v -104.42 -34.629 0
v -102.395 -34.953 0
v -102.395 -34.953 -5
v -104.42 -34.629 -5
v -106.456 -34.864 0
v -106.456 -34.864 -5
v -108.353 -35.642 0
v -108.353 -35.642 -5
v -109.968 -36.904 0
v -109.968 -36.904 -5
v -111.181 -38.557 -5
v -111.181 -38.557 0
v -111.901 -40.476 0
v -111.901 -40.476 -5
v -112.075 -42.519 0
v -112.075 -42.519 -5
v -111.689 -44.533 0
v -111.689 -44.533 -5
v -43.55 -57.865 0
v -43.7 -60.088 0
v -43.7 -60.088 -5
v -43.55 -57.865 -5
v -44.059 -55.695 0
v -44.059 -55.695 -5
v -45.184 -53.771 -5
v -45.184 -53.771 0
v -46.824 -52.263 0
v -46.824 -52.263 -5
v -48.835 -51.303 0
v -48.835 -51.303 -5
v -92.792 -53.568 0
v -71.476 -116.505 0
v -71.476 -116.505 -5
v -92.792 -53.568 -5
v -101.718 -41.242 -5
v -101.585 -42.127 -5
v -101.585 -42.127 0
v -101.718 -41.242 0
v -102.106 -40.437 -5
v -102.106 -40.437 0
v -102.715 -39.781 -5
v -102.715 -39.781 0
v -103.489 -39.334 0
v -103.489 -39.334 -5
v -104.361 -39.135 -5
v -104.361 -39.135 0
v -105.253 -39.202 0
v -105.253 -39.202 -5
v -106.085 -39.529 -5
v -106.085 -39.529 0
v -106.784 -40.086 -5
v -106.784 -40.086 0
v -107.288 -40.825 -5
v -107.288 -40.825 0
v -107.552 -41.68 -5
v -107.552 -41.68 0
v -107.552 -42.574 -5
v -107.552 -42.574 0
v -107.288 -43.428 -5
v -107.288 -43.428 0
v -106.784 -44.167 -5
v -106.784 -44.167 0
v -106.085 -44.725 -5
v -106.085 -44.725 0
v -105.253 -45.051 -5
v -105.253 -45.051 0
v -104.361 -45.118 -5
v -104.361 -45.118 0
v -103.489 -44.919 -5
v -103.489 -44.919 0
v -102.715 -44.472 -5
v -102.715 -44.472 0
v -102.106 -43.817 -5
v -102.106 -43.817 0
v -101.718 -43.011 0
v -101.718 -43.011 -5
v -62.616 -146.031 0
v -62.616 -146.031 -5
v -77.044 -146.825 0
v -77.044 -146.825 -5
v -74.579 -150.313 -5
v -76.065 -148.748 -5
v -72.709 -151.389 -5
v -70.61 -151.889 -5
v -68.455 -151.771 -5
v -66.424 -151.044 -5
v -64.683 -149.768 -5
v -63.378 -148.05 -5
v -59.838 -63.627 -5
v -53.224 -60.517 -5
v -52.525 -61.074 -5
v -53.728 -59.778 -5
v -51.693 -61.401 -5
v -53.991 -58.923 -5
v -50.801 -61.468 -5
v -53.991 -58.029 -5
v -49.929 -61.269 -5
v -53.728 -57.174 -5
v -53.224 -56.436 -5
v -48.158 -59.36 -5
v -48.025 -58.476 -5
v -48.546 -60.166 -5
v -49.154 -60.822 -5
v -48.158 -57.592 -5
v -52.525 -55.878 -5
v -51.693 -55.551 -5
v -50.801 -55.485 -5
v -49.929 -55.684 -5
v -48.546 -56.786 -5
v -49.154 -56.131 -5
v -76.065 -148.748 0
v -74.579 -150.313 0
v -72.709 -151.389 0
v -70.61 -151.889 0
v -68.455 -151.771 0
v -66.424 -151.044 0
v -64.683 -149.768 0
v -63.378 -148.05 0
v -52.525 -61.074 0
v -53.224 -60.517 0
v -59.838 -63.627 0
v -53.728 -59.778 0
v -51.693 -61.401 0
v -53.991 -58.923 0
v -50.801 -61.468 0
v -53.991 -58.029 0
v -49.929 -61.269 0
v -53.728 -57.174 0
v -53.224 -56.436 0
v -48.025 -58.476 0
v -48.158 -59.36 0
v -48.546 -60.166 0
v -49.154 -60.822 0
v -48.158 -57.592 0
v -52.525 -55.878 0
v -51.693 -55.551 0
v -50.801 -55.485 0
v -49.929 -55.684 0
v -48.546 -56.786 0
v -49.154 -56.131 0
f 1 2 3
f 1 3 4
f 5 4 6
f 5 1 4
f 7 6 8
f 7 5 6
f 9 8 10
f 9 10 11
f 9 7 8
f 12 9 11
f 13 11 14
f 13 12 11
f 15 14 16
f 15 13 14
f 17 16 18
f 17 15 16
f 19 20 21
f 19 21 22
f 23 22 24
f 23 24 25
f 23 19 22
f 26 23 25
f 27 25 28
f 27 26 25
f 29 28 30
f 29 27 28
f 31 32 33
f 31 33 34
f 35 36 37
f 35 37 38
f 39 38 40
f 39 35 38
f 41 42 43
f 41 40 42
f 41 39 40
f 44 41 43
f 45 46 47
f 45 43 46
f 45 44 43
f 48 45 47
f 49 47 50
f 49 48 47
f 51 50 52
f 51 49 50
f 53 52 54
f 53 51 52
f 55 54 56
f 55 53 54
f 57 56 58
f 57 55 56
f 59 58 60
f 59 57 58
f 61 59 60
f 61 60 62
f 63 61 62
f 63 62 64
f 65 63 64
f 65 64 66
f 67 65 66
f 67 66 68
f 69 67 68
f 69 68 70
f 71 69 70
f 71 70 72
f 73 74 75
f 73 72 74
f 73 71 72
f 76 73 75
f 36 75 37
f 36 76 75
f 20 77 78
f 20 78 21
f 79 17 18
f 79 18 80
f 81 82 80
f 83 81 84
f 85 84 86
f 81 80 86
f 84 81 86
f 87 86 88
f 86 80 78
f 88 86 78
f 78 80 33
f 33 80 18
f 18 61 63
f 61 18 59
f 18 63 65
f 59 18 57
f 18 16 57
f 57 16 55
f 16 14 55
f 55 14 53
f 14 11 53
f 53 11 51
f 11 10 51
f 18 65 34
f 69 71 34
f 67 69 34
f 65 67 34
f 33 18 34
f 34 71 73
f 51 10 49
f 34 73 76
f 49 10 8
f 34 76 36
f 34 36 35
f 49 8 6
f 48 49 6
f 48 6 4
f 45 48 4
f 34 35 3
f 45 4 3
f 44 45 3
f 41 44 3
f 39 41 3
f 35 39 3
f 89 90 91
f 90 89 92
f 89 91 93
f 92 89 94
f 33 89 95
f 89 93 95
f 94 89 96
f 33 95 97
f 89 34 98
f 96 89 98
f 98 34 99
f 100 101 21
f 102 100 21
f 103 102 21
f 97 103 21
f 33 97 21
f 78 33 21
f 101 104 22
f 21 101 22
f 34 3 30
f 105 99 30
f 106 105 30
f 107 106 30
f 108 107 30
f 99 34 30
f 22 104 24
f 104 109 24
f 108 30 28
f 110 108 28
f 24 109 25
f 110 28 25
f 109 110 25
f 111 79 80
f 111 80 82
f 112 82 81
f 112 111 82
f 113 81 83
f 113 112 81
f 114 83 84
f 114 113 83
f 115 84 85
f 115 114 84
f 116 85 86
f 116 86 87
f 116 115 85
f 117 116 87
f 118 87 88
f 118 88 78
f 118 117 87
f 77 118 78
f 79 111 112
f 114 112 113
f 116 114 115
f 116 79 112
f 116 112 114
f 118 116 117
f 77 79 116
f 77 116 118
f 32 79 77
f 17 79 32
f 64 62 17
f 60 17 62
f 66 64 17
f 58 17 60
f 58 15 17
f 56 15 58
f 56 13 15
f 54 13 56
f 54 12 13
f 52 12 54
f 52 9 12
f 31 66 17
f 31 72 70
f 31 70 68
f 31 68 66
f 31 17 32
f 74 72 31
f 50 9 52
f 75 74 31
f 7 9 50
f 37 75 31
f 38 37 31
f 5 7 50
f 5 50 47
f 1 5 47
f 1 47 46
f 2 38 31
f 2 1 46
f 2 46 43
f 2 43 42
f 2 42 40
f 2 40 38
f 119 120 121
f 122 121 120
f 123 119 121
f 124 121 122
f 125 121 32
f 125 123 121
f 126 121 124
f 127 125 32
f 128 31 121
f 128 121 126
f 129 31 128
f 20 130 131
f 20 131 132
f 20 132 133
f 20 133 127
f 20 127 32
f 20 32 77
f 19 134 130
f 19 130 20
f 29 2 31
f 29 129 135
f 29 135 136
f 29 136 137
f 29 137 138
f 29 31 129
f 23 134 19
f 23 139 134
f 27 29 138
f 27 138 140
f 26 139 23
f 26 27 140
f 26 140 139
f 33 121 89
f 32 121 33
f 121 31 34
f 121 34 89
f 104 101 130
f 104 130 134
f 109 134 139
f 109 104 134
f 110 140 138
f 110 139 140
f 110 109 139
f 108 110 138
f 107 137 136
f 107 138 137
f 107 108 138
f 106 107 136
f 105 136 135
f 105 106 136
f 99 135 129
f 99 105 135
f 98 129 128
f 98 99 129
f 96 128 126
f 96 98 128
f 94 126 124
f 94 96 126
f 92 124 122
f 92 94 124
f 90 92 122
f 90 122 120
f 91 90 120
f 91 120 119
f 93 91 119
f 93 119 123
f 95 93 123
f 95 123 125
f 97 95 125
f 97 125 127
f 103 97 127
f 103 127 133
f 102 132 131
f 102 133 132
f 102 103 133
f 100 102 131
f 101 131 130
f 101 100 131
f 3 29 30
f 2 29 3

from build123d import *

# Parameters (mm, degrees)
BOSS_EXTRU_1_DEPTH           = 5
ENL_V_MAT_EXTRU_1_DEPTH      = 189.858435052
ENL_V_MAT_EXTRU_1_DEPTH_BACK = 189.858435052
ESQUISSE2_R                  = 3


with BuildPart() as part:
    # Esquisse1 → Boss.-Extru.1 (new body)
    with BuildSketch(Plane.XY):
        with BuildLine():
            Line((-111.688798728, -44.532571199), (-77.044116728, -146.825024533))
            ThreePointArc((-77.044116728, -146.825024533), (-69.528491269, -151.907819965), (-62.615784867, -146.03126267))
            Line((-62.615784867, -146.03126267), (-43.700257251, -60.088241923))
            ThreePointArc((-43.700257251, -60.088241923), (-44.549891694, -54.691461284), (-48.835290369, -51.302880733))
            Line((-48.835290369, -51.302880733), (-102.395499985, -34.953448145))
            ThreePointArc((-102.395499985, -34.953448145), (-109.968158579, -36.904307457), (-111.688798728, -44.532571199))
        make_face()
        Polygon((-59.838234907, -63.627479624), (-71.476166828, -116.504620821), (-92.791588673, -53.5683585), align=None, mode=Mode.SUBTRACT)
    extrude(amount=-BOSS_EXTRU_1_DEPTH)

    # Esquisse2 → Enlèv. mat.-Extru.1 (cut, two sides: drawn at the far end of the back side and taken through both)
    with BuildSketch(Plane.XY.offset(-ENL_V_MAT_EXTRU_1_DEPTH_BACK)):
        with Locations((-51.024946519, -58.476123092)):
            Circle(ESQUISSE2_R)
        with Locations((-104.585156135, -42.126690504)):
            Circle(ESQUISSE2_R)
    extrude(amount=ENL_V_MAT_EXTRU_1_DEPTH + ENL_V_MAT_EXTRU_1_DEPTH_BACK, mode=Mode.SUBTRACT)


solid = part.part
